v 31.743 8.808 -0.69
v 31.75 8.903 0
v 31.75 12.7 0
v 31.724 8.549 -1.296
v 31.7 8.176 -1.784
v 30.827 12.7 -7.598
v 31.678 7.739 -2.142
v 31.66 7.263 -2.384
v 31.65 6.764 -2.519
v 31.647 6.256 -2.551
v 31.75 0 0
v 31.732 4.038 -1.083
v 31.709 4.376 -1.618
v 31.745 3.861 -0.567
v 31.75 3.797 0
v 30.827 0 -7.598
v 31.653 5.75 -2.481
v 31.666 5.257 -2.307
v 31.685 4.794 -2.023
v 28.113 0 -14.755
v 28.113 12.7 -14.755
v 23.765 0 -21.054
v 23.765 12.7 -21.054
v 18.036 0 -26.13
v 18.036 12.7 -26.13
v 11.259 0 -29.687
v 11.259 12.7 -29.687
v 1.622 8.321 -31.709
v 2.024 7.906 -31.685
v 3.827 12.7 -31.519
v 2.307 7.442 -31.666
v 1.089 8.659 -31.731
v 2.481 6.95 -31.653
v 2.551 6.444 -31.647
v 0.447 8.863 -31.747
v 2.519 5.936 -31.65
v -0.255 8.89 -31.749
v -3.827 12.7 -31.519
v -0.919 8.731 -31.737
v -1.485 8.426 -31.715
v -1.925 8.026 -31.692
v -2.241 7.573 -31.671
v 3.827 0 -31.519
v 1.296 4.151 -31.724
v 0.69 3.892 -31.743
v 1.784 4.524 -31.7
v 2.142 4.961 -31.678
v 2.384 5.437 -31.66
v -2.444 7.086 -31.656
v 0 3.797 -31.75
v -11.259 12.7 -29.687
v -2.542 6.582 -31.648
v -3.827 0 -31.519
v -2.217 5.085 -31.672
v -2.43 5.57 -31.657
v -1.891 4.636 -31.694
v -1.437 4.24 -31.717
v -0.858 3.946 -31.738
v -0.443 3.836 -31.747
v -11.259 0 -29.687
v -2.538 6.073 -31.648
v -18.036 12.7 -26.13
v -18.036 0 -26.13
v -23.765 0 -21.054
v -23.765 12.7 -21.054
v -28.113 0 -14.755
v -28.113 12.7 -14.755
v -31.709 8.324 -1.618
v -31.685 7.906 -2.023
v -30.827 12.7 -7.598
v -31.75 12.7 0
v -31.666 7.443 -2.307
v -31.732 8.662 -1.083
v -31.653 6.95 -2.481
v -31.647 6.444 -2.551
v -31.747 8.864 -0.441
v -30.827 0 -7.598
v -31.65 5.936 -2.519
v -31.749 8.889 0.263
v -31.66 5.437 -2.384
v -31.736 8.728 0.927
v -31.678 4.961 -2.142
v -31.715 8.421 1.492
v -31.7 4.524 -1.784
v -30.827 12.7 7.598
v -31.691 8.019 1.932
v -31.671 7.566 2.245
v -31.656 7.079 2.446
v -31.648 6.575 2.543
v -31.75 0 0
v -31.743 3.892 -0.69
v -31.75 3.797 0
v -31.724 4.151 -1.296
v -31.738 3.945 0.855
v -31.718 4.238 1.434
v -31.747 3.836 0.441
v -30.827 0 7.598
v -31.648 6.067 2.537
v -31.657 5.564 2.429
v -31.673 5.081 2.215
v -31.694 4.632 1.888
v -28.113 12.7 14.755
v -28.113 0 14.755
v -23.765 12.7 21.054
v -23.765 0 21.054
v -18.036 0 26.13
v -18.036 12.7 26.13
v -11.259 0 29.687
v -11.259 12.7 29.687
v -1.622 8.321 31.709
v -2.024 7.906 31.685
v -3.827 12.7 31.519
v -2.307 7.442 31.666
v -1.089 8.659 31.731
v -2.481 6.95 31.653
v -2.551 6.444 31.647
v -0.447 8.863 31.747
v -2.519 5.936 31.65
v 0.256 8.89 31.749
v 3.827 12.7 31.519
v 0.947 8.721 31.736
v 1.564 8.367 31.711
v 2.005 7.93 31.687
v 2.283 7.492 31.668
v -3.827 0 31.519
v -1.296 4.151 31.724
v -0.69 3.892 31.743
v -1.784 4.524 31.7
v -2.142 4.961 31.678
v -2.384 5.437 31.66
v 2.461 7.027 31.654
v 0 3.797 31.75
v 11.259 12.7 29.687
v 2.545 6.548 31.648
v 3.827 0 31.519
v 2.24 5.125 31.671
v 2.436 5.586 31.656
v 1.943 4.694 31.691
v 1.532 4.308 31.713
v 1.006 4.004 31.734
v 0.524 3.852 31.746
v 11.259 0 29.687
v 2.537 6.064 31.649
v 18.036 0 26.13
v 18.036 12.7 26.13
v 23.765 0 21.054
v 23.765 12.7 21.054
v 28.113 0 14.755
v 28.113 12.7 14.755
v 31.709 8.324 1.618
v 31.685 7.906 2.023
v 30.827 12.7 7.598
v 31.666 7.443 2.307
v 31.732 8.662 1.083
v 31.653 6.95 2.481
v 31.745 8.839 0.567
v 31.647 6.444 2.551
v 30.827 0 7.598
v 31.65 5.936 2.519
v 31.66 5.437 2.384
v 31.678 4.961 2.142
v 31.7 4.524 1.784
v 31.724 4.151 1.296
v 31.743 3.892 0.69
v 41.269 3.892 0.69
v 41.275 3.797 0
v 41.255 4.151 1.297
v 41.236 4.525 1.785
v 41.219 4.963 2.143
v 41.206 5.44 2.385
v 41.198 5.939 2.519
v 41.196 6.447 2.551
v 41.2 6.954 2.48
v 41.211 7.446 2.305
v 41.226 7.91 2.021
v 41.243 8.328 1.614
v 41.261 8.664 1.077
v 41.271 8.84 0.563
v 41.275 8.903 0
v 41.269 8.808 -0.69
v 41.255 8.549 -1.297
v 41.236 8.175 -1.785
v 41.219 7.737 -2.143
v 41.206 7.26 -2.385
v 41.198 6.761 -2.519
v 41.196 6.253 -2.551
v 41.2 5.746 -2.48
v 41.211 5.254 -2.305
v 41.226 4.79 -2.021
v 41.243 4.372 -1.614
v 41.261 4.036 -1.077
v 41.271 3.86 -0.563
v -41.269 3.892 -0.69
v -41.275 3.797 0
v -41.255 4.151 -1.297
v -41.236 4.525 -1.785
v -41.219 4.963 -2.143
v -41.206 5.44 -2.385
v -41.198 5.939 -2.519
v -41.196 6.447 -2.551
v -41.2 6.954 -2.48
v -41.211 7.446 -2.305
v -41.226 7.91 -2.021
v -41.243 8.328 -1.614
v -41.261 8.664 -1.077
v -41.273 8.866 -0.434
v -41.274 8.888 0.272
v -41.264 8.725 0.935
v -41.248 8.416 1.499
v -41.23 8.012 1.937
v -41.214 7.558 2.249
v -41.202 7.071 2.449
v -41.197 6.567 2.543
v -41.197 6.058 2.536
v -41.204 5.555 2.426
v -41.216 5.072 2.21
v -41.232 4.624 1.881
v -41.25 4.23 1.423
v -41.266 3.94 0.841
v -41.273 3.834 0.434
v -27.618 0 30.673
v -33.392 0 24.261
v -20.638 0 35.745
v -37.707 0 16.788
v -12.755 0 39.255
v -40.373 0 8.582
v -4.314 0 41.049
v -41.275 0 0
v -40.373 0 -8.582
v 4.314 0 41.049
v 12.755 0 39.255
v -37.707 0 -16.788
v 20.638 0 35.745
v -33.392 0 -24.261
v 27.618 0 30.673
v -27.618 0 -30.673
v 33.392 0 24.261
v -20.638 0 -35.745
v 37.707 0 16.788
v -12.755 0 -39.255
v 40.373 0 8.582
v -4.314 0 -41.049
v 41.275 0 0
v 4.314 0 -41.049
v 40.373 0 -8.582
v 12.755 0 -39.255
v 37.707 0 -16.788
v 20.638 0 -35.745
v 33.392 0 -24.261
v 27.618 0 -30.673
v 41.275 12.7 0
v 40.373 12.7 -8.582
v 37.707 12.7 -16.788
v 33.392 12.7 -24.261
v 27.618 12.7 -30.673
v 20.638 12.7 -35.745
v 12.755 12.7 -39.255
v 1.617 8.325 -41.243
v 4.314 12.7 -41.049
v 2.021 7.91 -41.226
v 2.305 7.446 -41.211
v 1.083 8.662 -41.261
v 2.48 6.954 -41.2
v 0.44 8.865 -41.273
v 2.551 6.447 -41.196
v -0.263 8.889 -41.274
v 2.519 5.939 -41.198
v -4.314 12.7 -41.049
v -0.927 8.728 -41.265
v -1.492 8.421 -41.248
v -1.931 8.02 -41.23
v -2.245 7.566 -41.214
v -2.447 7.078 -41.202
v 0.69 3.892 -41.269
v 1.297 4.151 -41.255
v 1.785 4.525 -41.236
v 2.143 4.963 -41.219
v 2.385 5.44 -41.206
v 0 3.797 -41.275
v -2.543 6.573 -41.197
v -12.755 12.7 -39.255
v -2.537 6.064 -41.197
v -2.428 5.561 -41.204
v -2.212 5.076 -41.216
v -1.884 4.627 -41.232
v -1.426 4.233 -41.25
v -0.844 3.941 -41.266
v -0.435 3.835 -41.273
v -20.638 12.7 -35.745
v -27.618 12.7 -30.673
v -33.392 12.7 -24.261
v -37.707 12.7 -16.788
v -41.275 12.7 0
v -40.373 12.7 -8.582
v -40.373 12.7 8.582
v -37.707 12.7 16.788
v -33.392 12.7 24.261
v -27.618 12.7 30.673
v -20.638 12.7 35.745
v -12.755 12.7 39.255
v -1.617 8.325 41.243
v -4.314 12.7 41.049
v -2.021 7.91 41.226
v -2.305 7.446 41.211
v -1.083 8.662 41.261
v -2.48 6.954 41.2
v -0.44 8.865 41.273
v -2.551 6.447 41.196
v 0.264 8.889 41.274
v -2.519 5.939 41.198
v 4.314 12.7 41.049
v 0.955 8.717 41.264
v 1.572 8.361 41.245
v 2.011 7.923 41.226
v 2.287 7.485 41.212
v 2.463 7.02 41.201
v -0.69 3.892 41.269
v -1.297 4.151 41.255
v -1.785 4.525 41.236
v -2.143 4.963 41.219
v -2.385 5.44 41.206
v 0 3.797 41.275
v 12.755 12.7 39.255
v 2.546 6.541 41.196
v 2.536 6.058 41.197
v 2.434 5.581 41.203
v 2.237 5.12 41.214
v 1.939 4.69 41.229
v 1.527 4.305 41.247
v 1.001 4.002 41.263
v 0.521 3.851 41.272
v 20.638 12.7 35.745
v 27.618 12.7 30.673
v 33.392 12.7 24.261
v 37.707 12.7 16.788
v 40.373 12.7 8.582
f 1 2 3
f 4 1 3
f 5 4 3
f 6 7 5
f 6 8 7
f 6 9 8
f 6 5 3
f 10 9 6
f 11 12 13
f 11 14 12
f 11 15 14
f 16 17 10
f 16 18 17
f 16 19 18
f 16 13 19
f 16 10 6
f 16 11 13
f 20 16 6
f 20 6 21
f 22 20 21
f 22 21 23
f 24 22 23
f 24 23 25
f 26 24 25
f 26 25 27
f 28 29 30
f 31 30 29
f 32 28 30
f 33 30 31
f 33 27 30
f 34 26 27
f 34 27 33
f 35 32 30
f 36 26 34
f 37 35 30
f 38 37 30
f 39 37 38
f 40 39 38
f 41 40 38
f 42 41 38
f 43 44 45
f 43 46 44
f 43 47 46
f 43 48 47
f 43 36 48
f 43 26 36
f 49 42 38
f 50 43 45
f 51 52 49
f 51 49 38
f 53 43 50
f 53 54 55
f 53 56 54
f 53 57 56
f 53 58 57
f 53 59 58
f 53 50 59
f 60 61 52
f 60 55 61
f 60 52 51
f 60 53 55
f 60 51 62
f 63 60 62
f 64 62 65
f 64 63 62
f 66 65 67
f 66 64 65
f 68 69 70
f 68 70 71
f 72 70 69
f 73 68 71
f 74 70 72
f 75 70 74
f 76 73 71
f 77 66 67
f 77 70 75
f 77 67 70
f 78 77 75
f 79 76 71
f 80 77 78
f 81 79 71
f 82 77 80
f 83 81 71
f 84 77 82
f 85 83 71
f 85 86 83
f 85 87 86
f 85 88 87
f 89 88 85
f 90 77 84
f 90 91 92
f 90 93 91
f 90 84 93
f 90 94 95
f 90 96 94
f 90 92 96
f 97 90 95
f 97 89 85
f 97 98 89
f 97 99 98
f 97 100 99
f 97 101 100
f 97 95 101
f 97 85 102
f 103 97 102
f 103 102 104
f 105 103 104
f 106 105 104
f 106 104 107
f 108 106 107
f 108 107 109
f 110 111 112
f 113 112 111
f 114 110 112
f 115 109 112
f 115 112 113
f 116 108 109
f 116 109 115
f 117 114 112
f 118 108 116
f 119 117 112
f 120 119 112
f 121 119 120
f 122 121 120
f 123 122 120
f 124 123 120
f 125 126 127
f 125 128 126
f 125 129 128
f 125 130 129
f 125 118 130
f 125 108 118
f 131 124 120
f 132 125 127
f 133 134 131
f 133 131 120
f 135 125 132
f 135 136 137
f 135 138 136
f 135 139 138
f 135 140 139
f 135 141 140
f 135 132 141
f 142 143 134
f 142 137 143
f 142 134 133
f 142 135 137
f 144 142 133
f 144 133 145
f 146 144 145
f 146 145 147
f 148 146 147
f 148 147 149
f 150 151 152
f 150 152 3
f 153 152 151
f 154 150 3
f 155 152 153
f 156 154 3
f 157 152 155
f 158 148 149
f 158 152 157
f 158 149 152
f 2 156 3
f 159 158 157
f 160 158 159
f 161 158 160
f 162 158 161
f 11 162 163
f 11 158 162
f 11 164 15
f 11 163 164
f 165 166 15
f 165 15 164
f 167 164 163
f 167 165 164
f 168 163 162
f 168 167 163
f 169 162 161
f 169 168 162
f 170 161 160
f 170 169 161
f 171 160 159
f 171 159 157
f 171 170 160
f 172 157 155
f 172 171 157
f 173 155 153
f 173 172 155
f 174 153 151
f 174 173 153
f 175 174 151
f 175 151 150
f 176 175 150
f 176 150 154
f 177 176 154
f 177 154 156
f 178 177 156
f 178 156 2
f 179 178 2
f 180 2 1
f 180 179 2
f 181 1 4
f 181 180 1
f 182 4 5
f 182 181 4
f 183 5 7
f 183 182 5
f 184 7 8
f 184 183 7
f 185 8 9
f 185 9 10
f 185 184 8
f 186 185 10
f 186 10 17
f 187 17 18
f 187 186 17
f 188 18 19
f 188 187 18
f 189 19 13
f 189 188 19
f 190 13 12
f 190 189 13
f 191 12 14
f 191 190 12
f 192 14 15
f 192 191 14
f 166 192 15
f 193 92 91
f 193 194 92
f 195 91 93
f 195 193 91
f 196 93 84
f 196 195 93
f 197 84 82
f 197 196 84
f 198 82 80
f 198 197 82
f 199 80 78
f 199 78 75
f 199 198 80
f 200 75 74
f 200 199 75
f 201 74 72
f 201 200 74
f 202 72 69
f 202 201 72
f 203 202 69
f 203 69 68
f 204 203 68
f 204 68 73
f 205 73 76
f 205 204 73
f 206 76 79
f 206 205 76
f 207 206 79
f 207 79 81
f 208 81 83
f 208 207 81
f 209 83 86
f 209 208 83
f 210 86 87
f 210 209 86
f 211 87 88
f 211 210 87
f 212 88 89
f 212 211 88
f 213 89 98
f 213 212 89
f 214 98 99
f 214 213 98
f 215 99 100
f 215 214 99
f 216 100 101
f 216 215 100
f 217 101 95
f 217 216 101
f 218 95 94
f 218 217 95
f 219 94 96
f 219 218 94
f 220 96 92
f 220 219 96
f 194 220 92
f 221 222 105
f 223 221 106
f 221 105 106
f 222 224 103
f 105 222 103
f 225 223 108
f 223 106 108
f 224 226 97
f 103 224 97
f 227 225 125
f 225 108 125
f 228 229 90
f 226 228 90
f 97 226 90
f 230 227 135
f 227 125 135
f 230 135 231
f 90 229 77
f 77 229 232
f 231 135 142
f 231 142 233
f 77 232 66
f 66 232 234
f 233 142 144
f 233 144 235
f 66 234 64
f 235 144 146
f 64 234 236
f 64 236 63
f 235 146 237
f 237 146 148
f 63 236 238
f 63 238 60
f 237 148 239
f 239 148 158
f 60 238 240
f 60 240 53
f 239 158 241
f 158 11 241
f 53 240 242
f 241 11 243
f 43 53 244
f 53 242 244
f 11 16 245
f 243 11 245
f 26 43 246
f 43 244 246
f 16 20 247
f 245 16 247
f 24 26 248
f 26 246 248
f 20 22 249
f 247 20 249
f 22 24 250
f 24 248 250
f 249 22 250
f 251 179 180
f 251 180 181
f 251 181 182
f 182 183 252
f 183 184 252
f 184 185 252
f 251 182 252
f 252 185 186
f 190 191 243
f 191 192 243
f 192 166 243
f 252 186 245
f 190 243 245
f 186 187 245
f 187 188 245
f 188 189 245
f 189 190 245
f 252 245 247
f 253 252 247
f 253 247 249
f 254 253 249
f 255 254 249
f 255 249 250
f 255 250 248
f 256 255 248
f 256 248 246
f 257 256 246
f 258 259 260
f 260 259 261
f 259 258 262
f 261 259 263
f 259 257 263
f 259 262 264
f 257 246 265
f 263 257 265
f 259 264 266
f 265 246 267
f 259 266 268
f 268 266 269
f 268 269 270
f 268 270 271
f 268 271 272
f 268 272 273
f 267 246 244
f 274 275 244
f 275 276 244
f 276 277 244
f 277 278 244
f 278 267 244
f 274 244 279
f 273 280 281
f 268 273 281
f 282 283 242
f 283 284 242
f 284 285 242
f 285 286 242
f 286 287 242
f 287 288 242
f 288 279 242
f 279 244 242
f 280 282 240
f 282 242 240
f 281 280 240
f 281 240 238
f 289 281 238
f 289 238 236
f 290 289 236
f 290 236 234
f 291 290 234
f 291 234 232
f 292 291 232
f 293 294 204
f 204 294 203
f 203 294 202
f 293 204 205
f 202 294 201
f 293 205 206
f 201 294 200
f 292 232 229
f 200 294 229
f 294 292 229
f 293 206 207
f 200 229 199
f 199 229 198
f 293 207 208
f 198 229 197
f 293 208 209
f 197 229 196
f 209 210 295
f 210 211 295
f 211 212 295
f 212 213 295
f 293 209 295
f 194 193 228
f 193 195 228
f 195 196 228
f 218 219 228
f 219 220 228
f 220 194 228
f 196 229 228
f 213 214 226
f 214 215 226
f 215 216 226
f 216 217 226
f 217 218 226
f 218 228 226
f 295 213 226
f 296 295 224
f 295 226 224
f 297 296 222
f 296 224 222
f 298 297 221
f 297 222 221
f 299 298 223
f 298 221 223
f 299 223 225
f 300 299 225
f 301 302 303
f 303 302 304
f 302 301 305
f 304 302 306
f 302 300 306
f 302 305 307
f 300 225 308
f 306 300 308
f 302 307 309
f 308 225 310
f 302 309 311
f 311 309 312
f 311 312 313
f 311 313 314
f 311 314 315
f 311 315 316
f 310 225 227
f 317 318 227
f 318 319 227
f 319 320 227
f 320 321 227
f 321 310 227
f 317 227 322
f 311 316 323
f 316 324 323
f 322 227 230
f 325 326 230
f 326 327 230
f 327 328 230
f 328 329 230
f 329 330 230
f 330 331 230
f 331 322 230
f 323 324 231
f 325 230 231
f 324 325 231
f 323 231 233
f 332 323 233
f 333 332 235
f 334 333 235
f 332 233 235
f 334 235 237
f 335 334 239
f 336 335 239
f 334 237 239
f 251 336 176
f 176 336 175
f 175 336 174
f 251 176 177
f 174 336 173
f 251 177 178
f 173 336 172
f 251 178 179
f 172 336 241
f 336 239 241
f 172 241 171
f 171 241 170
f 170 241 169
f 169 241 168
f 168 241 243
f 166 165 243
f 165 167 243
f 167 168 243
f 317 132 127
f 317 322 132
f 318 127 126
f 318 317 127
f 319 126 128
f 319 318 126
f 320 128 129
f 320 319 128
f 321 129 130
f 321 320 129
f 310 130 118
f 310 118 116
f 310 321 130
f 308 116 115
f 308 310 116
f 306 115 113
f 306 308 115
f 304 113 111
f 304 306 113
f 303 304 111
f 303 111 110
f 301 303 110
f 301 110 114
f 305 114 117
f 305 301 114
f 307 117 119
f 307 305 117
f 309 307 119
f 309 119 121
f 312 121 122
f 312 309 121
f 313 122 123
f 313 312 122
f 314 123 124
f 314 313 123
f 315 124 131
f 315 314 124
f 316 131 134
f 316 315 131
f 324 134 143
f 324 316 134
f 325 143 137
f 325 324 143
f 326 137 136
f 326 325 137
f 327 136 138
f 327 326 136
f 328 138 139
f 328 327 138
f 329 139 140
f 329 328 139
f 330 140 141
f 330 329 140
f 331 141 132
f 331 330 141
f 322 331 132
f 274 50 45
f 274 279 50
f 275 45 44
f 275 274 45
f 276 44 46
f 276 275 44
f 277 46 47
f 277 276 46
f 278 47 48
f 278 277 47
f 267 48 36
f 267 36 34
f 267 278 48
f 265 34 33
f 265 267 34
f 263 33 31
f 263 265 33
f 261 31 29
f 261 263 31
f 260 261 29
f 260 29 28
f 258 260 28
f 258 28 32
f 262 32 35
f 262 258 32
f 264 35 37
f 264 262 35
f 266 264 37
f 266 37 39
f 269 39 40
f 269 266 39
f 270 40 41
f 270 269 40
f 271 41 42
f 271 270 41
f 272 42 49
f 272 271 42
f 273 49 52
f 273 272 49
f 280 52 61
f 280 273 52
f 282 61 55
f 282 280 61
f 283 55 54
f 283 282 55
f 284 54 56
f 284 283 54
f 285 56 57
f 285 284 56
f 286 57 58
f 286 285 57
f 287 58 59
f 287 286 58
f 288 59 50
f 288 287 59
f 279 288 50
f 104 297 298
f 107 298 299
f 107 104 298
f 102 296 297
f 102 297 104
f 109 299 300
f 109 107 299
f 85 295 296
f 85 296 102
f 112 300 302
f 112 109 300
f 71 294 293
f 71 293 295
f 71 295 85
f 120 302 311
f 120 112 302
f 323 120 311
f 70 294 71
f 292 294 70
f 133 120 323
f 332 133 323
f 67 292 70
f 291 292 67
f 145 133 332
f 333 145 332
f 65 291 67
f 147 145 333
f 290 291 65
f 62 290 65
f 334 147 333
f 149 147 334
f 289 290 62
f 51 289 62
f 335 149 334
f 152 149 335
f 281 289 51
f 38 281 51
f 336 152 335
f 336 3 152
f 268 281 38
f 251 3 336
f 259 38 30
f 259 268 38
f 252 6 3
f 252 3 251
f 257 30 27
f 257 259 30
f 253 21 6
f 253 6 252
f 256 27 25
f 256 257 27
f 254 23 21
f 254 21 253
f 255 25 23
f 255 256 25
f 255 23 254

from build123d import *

# Parameters (mm, degrees)
SKETCH1_R           = 41.275
SKETCH1_R_2         = 31.75
BOSS_EXTRUDE1_DEPTH = 12.7
CIRPATTERN1_COUNT   = 4


with BuildPart() as part:
    # Sketch1 → Boss-Extrude1 (new body)
    with BuildSketch(Plane(origin=(0, 0, 0), x_dir=(1, 0, 0), z_dir=(0, 1, 0))):
        Circle(SKETCH1_R)
        Circle(SKETCH1_R_2, mode=Mode.SUBTRACT)
    extrude(amount=BOSS_EXTRUDE1_DEPTH)

    # Sketch3 → #7 (0.201) Diameter Hole1 (revolve, cut)
    with BuildSketch(Plane(origin=(0, 6.35, 41.275), x_dir=(0, -1, 0), z_dir=(1, 0, 0))):
        Polygon((0, 0), (0, 13.217816902), (2.5527, 11.684), (2.5527, 0), align=None)
    f_7_0_201_diameter_hole1 = revolve(axis=Axis((0, 6.35, 47.625), (0, 0, -1)), mode=Mode.SUBTRACT)

    # CirPattern1: #7 (0.201) Diameter Hole1 ×4 about axis
    cirpattern1_axis = Axis((0, -0.3175, 0), (0, 1, 0))
    for i in range(1, CIRPATTERN1_COUNT):
        add(f_7_0_201_diameter_hole1.rotate(cirpattern1_axis, i * 360 / CIRPATTERN1_COUNT), mode=Mode.SUBTRACT)


solid = part.part
